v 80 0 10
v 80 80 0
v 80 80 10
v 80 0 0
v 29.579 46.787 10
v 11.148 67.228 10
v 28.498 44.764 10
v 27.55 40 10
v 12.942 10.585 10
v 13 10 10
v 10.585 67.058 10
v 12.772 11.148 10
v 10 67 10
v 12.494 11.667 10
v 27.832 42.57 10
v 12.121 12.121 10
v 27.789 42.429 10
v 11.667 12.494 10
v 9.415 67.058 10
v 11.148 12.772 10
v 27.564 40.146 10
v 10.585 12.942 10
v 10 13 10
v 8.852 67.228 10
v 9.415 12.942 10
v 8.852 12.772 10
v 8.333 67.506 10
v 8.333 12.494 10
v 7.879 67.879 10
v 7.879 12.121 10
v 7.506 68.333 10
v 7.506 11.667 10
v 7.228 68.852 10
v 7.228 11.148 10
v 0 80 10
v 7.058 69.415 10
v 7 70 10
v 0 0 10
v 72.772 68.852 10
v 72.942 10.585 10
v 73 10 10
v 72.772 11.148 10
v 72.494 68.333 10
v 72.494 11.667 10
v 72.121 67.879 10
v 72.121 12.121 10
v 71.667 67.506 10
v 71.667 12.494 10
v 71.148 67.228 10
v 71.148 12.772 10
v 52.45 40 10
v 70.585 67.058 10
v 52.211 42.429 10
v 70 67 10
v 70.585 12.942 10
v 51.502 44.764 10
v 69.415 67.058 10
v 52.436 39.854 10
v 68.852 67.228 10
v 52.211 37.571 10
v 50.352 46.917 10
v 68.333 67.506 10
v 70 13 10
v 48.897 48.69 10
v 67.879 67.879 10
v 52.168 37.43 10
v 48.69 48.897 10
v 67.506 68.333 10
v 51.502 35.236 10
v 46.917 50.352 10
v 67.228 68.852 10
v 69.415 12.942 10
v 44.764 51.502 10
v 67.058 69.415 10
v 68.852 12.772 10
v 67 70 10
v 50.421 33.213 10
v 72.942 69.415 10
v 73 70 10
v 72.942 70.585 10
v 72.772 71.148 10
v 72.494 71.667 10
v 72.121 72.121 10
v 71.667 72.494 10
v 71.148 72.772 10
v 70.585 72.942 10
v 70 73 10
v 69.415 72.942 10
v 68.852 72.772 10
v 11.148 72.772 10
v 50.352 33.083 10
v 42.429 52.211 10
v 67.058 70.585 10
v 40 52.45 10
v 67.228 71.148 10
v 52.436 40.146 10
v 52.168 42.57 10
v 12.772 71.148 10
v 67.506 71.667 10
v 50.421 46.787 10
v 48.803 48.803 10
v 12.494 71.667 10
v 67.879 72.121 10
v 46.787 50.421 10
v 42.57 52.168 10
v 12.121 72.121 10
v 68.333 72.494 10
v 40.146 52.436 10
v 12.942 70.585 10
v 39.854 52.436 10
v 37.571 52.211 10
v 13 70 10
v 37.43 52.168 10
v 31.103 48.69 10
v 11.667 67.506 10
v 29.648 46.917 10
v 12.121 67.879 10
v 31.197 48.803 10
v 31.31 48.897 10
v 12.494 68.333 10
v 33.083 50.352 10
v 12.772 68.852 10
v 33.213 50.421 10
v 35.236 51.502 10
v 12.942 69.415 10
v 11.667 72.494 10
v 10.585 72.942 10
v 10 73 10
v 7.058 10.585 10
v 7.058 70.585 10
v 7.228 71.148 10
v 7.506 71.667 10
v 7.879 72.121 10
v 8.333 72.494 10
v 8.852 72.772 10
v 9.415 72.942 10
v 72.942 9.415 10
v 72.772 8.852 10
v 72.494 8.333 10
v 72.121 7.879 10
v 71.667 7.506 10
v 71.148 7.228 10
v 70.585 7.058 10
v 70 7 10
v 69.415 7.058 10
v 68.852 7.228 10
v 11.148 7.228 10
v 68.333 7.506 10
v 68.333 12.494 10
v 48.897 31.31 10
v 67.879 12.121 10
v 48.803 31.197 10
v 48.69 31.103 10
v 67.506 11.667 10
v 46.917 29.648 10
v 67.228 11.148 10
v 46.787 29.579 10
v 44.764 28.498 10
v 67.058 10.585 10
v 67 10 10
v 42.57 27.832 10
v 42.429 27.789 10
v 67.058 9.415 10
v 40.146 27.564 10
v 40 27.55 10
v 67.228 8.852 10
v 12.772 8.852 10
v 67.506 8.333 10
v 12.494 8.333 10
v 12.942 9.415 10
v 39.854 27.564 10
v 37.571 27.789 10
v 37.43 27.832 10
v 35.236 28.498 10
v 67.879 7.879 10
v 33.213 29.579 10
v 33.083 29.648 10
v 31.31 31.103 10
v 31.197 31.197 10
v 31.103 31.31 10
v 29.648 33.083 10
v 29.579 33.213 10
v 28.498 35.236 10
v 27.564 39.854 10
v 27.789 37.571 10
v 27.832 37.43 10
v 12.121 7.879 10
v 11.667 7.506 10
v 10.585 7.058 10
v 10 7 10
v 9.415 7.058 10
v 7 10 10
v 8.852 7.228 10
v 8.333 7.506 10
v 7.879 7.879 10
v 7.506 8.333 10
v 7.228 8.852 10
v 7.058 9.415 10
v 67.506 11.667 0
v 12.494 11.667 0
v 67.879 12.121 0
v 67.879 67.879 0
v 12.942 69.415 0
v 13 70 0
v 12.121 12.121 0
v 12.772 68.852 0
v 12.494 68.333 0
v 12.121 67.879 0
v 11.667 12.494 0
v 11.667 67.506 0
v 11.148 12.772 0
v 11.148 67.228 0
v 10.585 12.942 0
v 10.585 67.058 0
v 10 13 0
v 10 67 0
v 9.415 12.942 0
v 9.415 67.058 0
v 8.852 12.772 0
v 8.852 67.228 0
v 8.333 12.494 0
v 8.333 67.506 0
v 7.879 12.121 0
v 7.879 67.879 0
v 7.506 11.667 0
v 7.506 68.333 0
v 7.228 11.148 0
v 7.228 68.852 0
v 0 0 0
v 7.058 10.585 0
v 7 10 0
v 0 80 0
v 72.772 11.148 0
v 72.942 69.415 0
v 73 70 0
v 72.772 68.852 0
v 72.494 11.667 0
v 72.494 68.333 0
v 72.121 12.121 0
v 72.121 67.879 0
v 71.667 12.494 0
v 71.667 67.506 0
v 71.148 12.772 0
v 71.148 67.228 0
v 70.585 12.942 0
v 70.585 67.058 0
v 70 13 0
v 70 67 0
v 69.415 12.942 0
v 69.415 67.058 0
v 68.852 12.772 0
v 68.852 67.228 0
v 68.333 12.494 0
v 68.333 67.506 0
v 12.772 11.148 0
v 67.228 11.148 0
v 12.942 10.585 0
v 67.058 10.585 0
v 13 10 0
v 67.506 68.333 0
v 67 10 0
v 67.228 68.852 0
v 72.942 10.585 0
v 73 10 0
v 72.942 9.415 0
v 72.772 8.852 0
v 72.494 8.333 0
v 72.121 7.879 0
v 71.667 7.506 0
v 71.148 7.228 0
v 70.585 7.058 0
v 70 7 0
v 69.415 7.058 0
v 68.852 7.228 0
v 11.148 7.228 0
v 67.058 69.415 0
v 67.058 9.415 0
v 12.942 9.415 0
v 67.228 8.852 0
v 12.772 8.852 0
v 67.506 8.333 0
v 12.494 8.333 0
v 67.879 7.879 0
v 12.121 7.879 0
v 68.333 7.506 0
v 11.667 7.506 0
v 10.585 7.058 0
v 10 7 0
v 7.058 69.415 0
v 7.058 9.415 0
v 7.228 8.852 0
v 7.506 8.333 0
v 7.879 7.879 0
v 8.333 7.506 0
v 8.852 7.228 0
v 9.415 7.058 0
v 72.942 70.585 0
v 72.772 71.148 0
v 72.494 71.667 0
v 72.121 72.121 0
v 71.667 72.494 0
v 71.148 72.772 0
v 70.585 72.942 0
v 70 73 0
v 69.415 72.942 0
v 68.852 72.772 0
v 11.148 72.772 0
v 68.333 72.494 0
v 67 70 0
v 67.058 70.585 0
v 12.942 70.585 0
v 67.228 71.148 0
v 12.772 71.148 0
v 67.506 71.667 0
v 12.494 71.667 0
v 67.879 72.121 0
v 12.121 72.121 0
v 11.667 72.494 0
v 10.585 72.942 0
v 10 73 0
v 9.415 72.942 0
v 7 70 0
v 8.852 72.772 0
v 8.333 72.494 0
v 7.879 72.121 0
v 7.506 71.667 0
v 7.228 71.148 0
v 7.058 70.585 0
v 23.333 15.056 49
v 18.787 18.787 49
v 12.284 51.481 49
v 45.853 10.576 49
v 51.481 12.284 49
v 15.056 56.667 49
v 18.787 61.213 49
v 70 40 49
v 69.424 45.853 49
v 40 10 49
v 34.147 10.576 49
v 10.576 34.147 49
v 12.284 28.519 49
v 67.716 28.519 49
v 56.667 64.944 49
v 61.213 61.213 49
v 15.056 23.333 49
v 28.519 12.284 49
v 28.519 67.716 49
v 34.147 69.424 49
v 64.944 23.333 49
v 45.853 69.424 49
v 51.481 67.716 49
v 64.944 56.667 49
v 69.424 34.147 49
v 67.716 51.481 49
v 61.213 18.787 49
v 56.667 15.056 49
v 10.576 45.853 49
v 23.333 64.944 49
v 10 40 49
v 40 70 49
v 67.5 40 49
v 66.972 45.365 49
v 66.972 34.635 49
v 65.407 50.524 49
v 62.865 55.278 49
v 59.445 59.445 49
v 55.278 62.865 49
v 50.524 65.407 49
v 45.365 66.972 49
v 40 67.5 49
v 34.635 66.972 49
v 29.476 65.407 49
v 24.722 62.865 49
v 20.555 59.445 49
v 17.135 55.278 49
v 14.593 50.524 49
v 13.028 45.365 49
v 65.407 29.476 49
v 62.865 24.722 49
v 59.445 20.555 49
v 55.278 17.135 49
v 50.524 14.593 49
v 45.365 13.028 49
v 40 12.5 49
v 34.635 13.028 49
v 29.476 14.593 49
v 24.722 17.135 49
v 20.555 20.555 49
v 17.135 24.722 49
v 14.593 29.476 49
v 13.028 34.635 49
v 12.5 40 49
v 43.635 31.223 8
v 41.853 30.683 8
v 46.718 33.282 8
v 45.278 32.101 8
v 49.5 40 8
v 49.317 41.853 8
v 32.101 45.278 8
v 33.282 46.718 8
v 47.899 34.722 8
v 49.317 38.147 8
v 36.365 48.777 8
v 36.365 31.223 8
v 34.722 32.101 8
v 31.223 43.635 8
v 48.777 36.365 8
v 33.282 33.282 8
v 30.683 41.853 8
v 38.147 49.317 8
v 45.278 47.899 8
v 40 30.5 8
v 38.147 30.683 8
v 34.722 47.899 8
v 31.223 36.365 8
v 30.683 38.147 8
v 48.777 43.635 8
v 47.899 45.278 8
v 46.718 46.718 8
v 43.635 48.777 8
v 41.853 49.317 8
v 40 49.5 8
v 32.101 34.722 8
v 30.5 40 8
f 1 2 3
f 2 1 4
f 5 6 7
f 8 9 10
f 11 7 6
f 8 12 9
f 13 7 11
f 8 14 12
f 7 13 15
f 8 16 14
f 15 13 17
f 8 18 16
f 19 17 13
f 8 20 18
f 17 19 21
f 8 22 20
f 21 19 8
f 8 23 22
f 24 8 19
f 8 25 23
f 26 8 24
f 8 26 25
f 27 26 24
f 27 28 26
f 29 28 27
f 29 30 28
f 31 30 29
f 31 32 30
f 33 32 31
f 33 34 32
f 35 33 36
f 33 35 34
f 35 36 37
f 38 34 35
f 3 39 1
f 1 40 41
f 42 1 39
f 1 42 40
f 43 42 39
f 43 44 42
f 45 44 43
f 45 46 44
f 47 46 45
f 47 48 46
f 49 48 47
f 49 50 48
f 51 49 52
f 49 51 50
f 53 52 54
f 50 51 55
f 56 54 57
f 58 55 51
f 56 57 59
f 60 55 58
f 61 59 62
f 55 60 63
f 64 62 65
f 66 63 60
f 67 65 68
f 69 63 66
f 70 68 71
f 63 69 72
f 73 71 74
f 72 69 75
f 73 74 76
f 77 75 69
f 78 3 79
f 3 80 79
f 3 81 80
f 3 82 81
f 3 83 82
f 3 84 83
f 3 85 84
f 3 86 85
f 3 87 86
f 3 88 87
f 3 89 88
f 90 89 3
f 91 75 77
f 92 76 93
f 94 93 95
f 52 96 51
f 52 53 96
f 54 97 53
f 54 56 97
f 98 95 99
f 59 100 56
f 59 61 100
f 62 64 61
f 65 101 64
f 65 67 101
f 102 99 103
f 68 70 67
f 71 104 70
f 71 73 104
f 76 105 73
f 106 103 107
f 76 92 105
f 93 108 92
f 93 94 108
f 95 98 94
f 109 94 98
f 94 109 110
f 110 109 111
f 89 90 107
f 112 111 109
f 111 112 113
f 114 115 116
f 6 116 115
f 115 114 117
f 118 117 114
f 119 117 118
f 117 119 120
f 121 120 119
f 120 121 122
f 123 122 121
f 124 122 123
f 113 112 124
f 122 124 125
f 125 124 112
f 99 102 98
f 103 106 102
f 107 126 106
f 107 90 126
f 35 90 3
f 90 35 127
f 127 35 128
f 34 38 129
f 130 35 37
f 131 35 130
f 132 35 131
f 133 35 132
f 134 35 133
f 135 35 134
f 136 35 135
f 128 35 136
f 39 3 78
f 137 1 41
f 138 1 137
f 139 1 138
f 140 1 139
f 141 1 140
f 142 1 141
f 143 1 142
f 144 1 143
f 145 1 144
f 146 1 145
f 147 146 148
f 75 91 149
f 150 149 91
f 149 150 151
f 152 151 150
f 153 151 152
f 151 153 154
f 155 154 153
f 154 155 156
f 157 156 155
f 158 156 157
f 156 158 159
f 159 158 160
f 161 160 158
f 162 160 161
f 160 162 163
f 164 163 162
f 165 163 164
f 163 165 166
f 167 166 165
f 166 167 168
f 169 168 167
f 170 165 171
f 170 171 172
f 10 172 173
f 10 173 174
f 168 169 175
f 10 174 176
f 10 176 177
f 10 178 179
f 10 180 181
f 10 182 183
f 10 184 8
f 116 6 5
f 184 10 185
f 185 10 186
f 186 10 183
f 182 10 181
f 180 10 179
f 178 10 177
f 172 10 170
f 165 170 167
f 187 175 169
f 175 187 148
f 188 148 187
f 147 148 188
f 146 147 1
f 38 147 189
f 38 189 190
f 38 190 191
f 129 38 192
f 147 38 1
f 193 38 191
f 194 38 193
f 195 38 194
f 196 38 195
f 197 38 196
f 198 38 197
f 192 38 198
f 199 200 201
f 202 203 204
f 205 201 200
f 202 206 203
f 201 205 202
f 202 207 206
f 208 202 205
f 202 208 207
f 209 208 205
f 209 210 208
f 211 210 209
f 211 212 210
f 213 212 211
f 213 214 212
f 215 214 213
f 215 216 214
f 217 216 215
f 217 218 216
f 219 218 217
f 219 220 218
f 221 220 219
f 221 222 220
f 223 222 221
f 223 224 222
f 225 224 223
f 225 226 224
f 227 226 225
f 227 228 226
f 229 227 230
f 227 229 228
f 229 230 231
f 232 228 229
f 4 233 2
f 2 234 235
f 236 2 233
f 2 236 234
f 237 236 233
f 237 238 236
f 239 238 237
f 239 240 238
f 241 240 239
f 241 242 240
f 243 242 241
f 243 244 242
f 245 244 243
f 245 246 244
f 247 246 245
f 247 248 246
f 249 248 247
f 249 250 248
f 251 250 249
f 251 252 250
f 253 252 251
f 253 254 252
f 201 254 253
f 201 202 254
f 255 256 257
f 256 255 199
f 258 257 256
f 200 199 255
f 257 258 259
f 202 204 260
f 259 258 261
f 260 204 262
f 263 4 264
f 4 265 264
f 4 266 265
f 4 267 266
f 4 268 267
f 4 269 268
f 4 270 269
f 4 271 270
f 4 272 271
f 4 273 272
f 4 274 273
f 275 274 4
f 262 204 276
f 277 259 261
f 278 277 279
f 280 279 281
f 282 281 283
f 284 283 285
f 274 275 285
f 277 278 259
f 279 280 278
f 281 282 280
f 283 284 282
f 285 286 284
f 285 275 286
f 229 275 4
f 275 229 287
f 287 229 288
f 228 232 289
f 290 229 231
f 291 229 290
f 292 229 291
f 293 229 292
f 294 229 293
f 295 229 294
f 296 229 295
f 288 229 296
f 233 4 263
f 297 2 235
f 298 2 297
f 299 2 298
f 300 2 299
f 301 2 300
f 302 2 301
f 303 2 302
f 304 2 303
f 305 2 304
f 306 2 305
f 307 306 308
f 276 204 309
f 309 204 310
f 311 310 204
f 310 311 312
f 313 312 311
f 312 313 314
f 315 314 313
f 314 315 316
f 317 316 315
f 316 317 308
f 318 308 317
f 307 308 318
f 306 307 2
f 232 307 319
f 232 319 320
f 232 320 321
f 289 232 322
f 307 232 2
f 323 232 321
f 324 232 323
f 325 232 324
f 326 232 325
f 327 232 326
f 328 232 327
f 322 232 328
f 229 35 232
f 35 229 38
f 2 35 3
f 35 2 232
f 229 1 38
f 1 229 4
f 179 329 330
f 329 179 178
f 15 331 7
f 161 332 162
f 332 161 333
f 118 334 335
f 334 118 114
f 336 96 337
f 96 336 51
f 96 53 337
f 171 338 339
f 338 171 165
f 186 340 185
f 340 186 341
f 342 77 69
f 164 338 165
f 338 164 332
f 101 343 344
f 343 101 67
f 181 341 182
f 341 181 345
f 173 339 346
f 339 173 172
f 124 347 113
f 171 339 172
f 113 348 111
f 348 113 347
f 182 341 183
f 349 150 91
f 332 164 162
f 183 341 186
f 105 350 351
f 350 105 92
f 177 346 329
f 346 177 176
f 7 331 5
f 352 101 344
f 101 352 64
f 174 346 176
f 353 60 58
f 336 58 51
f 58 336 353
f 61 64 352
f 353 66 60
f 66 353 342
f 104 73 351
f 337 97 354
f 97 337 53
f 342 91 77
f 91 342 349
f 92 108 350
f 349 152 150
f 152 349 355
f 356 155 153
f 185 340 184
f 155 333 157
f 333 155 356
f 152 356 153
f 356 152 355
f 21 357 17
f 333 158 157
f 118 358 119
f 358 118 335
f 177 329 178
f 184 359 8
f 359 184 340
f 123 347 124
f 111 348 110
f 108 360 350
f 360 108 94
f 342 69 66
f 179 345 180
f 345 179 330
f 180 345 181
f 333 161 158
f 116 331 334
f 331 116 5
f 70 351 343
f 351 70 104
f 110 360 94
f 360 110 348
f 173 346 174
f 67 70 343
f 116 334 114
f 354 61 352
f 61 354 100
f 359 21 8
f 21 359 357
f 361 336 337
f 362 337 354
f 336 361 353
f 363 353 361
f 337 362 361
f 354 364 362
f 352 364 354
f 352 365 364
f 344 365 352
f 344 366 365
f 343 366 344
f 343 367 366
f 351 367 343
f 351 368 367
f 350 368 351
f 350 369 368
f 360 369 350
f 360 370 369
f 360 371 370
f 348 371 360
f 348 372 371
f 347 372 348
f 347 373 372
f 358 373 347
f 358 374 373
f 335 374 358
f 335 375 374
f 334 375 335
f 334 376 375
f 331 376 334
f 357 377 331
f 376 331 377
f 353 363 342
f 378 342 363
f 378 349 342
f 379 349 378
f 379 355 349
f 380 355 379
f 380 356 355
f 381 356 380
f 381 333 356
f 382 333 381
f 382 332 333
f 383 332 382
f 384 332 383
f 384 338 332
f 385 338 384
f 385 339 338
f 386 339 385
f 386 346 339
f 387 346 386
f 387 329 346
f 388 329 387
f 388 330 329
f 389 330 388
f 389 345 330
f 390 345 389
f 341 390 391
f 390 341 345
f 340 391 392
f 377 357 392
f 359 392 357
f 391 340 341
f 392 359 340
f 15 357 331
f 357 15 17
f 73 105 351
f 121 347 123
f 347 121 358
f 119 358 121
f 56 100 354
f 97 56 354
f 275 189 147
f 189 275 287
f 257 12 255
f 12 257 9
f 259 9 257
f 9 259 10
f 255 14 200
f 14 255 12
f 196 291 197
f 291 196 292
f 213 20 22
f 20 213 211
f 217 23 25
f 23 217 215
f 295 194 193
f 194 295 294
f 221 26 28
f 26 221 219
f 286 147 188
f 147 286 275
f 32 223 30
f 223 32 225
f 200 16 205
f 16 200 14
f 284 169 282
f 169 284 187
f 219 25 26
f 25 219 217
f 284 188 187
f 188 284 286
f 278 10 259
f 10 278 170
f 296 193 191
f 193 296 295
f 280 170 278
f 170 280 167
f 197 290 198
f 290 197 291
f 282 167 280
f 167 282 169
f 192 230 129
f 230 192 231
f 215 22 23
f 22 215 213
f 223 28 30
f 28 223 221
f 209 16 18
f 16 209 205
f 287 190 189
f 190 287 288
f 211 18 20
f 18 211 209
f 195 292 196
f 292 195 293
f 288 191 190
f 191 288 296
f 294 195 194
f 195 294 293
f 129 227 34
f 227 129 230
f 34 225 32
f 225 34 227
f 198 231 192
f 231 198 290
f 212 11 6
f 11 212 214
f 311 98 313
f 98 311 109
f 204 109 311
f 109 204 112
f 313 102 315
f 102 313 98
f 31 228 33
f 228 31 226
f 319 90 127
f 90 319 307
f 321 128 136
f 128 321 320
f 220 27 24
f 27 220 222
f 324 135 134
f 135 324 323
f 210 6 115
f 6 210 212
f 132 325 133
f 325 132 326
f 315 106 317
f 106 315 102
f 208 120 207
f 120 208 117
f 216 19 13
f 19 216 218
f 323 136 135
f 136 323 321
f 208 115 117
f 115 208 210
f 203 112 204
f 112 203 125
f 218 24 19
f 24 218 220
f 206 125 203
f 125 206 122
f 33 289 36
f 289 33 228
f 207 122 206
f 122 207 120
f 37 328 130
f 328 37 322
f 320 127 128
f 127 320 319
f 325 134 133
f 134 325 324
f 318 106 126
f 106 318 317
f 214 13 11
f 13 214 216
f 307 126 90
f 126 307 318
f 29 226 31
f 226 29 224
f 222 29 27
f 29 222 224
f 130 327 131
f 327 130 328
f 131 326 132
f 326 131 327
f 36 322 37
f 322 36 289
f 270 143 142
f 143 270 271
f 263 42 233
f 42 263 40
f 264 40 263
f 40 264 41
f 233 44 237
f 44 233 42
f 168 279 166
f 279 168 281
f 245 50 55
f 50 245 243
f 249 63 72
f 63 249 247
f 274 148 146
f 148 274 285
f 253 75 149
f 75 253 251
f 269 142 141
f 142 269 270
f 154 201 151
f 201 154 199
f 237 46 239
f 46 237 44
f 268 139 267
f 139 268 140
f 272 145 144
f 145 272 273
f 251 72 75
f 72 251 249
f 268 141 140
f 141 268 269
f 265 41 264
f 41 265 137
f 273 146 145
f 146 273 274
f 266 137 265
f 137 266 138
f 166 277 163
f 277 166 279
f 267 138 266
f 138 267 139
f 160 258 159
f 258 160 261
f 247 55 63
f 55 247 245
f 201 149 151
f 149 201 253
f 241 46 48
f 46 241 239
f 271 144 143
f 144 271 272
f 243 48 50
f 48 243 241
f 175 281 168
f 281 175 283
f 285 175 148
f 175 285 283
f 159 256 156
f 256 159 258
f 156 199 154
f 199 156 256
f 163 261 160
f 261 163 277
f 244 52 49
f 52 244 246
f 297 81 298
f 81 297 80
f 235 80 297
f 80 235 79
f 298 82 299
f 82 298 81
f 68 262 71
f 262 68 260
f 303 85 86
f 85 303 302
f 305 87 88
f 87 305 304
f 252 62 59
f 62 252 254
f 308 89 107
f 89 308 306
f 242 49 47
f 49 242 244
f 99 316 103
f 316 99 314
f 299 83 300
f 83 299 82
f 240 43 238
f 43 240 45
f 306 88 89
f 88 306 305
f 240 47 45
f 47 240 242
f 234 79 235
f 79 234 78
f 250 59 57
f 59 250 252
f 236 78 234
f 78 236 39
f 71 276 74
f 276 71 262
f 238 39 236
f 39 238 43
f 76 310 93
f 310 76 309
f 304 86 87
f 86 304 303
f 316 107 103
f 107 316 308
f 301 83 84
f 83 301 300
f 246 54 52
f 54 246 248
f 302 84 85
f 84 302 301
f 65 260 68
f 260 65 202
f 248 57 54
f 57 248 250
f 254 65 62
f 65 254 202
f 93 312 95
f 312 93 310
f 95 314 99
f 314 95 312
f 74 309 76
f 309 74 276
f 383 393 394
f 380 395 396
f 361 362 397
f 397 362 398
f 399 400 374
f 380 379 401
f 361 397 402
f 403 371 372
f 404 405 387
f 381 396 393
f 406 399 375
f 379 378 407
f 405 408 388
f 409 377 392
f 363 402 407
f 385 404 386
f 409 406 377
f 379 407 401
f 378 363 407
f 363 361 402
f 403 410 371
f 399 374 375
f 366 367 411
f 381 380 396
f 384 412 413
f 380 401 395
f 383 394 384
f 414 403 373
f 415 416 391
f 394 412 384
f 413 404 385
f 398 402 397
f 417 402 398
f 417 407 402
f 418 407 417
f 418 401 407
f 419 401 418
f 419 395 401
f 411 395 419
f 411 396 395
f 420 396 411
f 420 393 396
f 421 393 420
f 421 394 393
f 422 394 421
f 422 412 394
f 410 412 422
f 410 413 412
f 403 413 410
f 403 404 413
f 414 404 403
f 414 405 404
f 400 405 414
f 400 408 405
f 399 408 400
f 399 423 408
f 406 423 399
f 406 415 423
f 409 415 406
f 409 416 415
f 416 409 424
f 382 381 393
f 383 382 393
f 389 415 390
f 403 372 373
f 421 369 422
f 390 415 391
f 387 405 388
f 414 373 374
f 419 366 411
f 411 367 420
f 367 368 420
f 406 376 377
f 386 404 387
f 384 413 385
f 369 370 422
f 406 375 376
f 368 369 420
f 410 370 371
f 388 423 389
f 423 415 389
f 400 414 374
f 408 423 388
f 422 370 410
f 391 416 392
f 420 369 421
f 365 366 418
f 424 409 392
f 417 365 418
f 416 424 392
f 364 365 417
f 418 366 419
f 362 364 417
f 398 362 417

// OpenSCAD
$fn = 32;

// ----------------------------------------------------------------------
// Hopper: flanged with square flange
// ----------------------------------------------------------------------

// --- parameters (mm) ---
fl = 80;                  // flange side, X and Y
fl_t = 10;                // flange thickness
cone_h = 40;              // cone height above the flange
top_d = 60;               // cone mouth diameter
bot_d = 24;               // cone spout diameter
wall = 2.5;               // cone wall thickness
hole_r = 3;               // flange hole radius
hole_in = 10;             // hole inset from the corners

bore_d = bot_d - 2 * wall;  // spout bore diameter
total_h = fl_t + cone_h - 1;  // overall height

difference() {
  union() {
    cube([fl, fl, fl_t]);
    translate([fl / 2, fl / 2, fl_t - 1])
      cylinder(h = cone_h, d1 = bot_d, d2 = top_d);
  }
  translate([fl / 2, fl / 2, fl_t - 2])
    cylinder(h = cone_h + 1, d1 = bore_d, d2 = top_d - 2 * wall);
  for (sx = [0, 1], sy = [0, 1])
    translate([sx ? fl - hole_in : hole_in,
               sy ? fl - hole_in : hole_in, -1])
      cylinder(r = hole_r, h = fl_t + 2);
}
